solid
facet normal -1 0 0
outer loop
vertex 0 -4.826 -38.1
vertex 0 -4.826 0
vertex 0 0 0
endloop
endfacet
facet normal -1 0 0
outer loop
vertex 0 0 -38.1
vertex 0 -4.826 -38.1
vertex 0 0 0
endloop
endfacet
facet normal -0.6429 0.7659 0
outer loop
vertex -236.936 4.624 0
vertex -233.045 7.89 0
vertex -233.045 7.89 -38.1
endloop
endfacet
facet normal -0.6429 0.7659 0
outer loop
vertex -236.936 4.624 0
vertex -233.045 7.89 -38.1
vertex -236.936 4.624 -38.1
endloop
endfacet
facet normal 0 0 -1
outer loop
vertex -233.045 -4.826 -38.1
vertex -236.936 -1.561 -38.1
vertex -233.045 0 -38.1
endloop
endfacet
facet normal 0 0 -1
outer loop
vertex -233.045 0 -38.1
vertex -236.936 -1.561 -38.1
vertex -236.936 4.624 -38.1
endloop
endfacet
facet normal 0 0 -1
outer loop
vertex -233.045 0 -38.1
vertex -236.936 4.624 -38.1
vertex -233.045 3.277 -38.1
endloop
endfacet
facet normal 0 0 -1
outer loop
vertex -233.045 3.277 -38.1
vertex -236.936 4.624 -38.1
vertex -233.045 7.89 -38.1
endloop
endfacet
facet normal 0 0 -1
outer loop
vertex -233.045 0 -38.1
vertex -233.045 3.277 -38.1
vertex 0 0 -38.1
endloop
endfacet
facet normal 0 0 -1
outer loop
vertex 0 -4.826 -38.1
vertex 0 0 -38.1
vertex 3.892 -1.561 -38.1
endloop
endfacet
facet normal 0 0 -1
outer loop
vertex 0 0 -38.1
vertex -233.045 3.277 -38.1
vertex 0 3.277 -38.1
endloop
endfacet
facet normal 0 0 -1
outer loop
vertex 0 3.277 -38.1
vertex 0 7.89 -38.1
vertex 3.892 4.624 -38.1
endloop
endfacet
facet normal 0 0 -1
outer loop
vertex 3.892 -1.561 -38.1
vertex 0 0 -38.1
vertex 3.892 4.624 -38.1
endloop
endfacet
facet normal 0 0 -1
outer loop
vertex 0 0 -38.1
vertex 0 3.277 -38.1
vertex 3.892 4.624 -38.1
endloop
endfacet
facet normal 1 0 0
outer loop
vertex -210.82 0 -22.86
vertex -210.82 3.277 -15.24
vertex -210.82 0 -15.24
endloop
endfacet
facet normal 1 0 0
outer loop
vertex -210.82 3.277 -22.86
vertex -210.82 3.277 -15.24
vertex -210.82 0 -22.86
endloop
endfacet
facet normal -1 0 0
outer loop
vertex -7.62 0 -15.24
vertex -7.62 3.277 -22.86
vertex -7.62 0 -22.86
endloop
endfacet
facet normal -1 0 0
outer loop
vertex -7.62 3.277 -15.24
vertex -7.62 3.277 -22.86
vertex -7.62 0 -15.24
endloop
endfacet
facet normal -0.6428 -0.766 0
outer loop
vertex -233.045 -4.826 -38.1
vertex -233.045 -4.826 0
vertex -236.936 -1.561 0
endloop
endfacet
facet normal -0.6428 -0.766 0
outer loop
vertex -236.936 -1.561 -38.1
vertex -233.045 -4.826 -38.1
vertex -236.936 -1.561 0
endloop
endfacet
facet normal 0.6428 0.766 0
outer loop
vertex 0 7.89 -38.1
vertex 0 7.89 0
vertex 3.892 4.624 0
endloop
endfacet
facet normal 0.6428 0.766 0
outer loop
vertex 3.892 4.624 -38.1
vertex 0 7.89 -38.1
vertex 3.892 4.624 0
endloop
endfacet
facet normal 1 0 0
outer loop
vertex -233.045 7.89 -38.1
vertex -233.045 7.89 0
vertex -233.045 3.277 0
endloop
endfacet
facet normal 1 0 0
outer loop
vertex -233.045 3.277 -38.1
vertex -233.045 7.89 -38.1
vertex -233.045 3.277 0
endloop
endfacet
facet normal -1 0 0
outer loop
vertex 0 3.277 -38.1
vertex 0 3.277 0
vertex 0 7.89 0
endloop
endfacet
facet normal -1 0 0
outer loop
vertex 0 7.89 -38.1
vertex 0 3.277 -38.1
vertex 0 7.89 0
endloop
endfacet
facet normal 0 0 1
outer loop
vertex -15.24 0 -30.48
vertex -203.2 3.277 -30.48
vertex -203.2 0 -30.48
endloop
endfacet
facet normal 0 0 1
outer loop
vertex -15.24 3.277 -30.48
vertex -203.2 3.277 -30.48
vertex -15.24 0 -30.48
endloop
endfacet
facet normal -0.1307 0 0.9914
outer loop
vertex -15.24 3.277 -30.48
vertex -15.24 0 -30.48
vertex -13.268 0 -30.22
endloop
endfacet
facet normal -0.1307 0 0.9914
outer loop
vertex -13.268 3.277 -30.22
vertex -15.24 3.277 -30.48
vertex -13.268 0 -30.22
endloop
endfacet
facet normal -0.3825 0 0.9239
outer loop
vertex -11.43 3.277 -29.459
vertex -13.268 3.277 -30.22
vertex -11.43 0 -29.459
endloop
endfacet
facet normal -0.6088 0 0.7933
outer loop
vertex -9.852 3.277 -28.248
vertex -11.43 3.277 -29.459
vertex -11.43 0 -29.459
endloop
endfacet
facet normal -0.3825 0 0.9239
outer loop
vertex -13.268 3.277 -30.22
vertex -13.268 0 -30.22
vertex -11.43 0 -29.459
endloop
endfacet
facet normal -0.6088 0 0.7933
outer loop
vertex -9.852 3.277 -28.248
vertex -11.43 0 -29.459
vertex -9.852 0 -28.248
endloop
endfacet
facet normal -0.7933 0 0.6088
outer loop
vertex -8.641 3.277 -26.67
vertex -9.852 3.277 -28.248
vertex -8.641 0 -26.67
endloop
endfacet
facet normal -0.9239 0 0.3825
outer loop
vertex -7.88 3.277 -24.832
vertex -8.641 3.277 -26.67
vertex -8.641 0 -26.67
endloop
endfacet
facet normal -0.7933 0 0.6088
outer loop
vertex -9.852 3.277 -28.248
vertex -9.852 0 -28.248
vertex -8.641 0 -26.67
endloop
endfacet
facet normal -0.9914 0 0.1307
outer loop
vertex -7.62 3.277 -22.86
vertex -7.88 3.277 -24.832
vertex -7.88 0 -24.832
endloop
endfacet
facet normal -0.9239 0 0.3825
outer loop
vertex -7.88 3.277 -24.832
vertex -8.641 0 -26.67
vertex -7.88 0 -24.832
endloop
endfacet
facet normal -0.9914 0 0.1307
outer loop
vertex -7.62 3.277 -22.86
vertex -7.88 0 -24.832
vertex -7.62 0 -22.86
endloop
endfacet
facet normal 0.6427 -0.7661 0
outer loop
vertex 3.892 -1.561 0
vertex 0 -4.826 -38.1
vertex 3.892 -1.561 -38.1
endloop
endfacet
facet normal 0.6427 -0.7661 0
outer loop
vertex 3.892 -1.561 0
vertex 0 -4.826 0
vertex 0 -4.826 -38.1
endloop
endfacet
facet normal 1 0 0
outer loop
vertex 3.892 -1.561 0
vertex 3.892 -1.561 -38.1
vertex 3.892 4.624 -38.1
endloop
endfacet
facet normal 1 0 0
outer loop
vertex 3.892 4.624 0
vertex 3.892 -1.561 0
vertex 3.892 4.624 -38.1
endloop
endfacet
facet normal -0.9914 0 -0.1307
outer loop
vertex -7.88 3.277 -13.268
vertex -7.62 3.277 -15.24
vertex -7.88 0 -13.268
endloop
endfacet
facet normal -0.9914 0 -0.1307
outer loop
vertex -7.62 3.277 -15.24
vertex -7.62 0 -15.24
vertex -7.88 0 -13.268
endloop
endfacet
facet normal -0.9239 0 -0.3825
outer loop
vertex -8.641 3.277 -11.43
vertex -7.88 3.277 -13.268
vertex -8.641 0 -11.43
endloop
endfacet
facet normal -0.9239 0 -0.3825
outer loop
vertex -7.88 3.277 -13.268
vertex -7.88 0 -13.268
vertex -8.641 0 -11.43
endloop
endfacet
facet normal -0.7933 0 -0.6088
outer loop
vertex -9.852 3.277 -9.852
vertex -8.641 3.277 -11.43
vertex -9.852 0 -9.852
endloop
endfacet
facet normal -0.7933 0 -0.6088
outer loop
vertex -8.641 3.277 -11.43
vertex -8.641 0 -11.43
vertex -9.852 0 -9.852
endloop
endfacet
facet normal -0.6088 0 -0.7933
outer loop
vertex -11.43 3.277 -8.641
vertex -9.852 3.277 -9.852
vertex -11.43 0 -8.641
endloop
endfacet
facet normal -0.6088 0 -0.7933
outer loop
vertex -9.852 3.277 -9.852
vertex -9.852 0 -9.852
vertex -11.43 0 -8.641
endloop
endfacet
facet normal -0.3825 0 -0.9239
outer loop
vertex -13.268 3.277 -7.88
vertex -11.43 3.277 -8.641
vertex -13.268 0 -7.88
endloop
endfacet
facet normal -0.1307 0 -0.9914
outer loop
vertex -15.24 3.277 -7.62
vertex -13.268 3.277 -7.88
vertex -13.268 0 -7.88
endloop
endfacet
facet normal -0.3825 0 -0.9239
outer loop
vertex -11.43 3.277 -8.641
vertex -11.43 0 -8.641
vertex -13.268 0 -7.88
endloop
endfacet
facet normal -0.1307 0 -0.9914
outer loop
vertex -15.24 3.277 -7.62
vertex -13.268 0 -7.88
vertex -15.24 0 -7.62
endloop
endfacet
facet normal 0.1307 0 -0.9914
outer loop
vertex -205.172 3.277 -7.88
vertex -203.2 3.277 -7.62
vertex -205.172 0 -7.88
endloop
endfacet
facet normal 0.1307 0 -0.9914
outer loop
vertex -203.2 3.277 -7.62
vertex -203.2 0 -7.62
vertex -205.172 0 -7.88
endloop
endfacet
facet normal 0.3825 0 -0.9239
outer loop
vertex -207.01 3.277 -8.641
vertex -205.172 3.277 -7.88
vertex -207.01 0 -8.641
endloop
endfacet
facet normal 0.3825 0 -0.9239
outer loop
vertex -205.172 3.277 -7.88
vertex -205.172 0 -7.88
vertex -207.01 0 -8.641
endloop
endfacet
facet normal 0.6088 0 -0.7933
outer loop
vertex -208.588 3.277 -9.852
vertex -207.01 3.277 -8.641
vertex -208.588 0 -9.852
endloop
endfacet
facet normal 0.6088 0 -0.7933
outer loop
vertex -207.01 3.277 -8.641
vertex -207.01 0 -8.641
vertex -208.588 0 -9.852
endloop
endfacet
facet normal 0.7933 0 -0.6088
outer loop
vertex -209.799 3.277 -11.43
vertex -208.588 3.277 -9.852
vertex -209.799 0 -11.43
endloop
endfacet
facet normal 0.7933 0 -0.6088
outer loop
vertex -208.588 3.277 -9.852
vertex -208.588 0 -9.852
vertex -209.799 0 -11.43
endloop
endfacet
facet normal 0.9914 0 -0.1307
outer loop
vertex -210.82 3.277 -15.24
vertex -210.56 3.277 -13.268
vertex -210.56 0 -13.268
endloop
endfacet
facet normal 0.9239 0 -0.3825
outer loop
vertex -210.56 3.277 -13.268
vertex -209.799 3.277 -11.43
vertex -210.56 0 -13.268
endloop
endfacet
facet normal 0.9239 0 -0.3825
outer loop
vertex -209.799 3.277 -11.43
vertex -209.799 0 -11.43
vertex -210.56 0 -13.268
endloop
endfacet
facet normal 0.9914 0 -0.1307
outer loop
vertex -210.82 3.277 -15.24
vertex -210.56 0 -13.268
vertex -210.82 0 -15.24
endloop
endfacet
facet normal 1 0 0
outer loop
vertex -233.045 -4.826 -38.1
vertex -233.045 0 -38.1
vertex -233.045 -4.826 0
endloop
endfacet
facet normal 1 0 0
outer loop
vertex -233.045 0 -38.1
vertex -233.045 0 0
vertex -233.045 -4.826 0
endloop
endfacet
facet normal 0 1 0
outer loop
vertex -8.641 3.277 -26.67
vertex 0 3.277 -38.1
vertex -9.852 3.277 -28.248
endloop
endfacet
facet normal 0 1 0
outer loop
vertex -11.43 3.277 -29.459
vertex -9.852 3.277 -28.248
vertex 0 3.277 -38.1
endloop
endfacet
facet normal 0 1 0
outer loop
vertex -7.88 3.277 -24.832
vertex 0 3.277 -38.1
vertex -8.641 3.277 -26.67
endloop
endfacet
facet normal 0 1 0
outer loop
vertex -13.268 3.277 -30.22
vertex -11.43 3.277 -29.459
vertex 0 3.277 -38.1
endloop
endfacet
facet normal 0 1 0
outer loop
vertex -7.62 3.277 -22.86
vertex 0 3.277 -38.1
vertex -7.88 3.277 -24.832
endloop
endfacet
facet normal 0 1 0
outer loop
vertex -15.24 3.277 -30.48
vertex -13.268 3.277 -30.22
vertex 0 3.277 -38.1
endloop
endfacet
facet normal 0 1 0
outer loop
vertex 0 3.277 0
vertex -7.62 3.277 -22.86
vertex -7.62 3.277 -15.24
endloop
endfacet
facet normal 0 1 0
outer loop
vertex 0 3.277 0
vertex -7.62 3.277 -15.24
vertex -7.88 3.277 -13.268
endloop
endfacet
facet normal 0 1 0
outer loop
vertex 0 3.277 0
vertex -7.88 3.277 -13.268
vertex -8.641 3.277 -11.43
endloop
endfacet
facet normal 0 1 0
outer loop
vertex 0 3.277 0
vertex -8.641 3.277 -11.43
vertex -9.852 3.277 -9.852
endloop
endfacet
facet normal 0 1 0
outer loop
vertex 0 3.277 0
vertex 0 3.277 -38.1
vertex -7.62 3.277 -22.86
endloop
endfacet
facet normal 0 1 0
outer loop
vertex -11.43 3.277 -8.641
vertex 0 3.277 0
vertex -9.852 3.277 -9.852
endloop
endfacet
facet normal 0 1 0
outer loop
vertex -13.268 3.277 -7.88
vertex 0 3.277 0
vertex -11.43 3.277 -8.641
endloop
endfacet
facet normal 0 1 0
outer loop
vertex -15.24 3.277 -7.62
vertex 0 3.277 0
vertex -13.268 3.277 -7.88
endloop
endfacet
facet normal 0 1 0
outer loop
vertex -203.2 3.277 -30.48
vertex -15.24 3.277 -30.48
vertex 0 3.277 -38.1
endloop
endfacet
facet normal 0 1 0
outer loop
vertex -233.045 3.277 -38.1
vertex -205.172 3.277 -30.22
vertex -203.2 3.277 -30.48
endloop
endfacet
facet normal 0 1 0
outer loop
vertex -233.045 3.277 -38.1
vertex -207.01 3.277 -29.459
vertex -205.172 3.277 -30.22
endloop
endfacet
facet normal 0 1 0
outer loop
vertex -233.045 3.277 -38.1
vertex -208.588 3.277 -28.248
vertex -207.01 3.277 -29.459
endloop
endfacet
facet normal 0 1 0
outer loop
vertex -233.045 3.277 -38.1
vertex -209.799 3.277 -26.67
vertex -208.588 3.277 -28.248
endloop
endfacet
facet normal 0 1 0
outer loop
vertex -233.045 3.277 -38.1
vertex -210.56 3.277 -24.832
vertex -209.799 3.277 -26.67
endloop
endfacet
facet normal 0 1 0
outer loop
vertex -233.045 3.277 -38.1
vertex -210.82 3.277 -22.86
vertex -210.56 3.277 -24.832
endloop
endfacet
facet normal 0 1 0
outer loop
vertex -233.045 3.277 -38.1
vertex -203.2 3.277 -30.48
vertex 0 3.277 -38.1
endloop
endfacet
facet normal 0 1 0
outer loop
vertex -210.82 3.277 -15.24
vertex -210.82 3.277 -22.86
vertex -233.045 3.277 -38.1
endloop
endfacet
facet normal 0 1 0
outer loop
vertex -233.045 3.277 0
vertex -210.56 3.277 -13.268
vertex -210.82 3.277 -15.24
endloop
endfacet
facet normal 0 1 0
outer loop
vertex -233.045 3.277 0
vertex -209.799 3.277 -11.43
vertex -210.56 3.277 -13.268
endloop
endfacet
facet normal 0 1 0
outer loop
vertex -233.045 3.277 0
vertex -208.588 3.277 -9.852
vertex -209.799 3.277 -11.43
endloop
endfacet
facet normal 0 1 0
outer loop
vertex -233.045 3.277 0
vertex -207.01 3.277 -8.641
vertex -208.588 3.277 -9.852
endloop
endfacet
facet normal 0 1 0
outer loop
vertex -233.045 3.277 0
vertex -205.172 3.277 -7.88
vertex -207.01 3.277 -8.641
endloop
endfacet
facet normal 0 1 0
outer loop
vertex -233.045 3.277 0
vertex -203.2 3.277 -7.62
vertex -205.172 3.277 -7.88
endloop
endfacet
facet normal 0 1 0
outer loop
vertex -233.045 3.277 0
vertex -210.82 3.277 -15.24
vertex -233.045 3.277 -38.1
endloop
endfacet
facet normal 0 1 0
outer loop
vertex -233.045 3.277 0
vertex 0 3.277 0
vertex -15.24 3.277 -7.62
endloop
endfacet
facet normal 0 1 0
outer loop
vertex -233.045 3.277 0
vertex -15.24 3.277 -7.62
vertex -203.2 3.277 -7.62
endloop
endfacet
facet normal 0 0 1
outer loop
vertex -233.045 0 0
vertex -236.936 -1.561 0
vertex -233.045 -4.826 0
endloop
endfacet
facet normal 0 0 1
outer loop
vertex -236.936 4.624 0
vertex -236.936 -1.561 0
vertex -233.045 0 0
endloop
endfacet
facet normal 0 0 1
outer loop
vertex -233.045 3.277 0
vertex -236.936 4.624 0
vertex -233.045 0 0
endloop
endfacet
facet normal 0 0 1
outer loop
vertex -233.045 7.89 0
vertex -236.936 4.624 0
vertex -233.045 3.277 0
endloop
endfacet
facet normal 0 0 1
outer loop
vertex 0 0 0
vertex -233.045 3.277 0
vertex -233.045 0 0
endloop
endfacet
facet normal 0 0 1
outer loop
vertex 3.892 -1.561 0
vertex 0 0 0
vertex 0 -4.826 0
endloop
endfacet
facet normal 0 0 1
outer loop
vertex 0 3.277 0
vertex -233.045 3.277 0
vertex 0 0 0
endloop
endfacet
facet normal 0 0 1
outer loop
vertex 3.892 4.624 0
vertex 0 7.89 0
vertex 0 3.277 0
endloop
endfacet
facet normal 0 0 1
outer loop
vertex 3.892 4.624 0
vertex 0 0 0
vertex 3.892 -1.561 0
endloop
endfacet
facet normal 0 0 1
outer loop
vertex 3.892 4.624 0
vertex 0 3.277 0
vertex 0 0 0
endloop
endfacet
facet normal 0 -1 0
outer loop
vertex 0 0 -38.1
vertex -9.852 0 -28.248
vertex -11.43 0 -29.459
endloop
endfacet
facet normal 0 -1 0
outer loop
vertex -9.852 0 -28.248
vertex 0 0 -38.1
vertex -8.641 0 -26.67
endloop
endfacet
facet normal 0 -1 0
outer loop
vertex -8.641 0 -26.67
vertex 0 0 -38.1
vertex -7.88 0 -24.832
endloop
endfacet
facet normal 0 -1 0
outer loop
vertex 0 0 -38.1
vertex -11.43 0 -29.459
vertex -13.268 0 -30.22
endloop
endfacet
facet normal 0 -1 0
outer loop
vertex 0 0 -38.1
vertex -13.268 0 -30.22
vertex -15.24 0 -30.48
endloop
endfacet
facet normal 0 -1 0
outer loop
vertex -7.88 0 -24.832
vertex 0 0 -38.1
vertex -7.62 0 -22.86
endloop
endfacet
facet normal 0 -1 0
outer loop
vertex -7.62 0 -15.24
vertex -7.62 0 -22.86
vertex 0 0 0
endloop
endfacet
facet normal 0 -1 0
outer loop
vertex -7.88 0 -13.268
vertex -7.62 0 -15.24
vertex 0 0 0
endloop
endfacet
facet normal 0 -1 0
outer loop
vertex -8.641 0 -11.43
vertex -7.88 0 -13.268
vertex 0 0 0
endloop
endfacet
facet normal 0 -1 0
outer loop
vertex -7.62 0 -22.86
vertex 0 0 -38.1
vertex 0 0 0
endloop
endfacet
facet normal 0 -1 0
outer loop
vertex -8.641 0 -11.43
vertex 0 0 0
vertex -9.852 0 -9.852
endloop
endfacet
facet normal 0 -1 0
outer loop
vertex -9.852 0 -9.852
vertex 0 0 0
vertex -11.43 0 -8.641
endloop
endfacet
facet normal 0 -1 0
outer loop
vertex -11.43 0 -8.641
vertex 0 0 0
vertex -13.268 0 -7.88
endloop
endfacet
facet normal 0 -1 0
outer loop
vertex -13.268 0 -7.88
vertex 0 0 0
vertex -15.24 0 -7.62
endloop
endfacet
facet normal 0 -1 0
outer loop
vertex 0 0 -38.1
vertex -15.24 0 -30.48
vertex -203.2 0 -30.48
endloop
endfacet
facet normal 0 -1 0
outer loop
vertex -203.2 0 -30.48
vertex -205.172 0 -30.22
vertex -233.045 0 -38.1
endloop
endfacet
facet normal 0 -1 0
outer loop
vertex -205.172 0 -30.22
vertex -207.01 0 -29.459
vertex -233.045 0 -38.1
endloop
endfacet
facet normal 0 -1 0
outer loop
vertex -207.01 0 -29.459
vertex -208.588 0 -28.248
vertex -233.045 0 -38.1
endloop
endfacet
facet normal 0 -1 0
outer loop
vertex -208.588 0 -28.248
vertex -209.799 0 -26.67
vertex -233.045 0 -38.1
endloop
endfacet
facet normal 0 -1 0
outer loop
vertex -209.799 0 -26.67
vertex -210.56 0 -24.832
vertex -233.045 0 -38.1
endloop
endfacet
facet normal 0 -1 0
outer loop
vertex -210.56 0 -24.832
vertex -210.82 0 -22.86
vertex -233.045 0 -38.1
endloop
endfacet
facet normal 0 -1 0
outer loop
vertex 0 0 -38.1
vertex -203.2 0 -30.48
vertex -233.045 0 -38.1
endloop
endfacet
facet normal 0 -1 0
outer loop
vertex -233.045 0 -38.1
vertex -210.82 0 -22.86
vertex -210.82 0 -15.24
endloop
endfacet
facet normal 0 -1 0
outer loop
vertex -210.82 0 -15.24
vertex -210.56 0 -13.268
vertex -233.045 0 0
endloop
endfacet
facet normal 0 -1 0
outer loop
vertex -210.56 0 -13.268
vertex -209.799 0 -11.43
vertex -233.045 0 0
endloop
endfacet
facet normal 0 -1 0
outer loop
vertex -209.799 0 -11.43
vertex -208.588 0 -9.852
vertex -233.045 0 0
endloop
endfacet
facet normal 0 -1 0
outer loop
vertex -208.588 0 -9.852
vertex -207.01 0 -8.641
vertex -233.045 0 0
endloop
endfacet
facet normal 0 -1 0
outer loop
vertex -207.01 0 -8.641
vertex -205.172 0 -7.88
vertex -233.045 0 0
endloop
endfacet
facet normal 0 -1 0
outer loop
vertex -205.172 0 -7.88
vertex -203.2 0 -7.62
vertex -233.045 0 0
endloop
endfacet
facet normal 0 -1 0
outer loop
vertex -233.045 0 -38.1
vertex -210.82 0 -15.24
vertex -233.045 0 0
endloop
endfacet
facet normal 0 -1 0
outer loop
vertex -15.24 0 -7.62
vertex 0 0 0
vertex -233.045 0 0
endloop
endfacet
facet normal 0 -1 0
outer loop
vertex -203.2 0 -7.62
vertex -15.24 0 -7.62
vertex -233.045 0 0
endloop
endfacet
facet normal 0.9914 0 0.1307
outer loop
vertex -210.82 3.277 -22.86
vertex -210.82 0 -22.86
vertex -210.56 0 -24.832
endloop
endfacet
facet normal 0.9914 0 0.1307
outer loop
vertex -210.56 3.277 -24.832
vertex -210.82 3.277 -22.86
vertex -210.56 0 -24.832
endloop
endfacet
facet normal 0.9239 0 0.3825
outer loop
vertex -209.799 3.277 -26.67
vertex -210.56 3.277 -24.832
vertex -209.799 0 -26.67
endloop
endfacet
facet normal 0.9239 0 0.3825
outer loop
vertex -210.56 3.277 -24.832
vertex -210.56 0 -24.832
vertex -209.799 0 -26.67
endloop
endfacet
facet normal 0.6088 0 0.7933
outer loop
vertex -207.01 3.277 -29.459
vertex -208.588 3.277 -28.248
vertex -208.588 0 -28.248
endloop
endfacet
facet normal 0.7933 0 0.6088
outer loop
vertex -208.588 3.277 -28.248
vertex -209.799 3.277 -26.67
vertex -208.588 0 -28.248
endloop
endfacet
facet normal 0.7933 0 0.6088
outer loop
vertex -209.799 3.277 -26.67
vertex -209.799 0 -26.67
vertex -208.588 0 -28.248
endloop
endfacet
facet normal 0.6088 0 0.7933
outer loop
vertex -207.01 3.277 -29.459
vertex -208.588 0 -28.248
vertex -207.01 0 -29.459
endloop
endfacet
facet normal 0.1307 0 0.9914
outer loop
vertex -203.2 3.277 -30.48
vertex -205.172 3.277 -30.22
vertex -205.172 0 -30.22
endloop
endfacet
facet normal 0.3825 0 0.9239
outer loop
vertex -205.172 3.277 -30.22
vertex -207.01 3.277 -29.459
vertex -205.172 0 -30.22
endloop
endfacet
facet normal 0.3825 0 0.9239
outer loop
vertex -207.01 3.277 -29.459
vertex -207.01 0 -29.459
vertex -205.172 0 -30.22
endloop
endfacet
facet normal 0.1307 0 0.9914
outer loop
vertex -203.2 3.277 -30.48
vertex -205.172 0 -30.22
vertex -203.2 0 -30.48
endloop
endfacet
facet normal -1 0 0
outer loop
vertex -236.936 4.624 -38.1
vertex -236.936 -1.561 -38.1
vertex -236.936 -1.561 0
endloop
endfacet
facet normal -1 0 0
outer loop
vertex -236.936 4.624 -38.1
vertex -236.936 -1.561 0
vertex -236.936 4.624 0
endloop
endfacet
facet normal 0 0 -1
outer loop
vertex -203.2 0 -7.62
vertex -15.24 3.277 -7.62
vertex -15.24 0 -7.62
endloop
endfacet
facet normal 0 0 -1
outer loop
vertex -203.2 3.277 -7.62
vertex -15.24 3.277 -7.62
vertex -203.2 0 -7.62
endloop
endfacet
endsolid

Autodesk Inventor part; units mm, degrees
ref_plane "YZ Plane" through (0, 0, 0) normal (1, 0, 0) x (0, 1, 0)
ref_plane "XZ Plane" through (0, 0, 0) normal (0, 1, 0) x (-1, 0, 0)
ref_plane "XY Plane" through (0, 0, 0) normal (0, 0, 1) x (1, 0, 0)
sketch "Sketch1" plane through (0, 0, 0) normal (0, 1, 0) x (-1, 0, 0)
  line L0 (0, 0) -> (233.045, 0)
  line L1 (233.045, 0) -> (233.045, -38.1)
  line L2 (233.045, -38.1) -> (0, -38.1)
  line L3 (0, -38.1) -> (0, 0)
  dimension "d0" = 233.045
  dimension "d1" = 38.1
extrude "Extrusion1" add sketch "Sketch1" along normal blind 3.2766
sketch "Sketch2" plane through (0, 3.2766, 0) normal (0, 1, 0) x (1, 0, 0)
  line L0 (-7.62, 7.62) -> (-210.82, 7.62)
  line L1 (-210.82, 7.62) -> (-210.82, 30.48)
  line L2 (-210.82, 30.48) -> (-7.62, 30.48)
  line L3 (-7.62, 30.48) -> (-7.62, 7.62)
  point P0 (0, 0)
  dimension "d4" = 203.2
  dimension "d5" = 22.86
extrude "Extrusion2" cut sketch "Sketch2" against normal through all
fillet "Face Fillet1" radius 7.62 1 edges at (-210.82, 1.6383, -30.48)
fillet "Face Fillet2" radius 7.62 1 edges at (-210.82, 1.6383, -7.62)
fillet "Face Fillet3" radius 7.62 1 edges at (-7.62, 1.6383, -30.48)
fillet "Face Fillet4" radius 7.62 1 edges at (-7.62, 1.6383, -7.62)
sketch "Sketch3" plane through (-233.045, 0, 0) normal (0, 0, 1) x (1, 0, 0)
  line L0 (233.045, -4.826) -> (233.045, 7.8895)
  line L1 (233.045, 7.8895) -> (236.9365, 4.6242)
  line L2 (233.045, -4.826) -> (236.9365, -1.5606)
  line L3 (233.045, -4.826) -> (238.125, -4.826) construction
  line L4 (236.9365, -1.5606) -> (236.9365, 4.6242)
  line L5 (0, 7.8895) -> (0, -4.826)
  line L6 (0, -4.826) -> (-3.8915, -1.5606)
  line L7 (0, 7.8895) -> (-3.8915, 4.6242)
  line L8 (-3.8915, -1.5606) -> (-3.8915, 4.6242)
  point P0 (233.045, 0)
  dimension "d12" = 5.08
  dimension "d13" = 50
  dimension "d14" = 5.08
  dimension "d15" = 40
  dimension "d16" = 5.08
  dimension "d17" = 50
  dimension "d18" = 5.08
extrude "Extrusion3" add sketch "Sketch3" against normal blind 38.1
properties part number "short slider"
